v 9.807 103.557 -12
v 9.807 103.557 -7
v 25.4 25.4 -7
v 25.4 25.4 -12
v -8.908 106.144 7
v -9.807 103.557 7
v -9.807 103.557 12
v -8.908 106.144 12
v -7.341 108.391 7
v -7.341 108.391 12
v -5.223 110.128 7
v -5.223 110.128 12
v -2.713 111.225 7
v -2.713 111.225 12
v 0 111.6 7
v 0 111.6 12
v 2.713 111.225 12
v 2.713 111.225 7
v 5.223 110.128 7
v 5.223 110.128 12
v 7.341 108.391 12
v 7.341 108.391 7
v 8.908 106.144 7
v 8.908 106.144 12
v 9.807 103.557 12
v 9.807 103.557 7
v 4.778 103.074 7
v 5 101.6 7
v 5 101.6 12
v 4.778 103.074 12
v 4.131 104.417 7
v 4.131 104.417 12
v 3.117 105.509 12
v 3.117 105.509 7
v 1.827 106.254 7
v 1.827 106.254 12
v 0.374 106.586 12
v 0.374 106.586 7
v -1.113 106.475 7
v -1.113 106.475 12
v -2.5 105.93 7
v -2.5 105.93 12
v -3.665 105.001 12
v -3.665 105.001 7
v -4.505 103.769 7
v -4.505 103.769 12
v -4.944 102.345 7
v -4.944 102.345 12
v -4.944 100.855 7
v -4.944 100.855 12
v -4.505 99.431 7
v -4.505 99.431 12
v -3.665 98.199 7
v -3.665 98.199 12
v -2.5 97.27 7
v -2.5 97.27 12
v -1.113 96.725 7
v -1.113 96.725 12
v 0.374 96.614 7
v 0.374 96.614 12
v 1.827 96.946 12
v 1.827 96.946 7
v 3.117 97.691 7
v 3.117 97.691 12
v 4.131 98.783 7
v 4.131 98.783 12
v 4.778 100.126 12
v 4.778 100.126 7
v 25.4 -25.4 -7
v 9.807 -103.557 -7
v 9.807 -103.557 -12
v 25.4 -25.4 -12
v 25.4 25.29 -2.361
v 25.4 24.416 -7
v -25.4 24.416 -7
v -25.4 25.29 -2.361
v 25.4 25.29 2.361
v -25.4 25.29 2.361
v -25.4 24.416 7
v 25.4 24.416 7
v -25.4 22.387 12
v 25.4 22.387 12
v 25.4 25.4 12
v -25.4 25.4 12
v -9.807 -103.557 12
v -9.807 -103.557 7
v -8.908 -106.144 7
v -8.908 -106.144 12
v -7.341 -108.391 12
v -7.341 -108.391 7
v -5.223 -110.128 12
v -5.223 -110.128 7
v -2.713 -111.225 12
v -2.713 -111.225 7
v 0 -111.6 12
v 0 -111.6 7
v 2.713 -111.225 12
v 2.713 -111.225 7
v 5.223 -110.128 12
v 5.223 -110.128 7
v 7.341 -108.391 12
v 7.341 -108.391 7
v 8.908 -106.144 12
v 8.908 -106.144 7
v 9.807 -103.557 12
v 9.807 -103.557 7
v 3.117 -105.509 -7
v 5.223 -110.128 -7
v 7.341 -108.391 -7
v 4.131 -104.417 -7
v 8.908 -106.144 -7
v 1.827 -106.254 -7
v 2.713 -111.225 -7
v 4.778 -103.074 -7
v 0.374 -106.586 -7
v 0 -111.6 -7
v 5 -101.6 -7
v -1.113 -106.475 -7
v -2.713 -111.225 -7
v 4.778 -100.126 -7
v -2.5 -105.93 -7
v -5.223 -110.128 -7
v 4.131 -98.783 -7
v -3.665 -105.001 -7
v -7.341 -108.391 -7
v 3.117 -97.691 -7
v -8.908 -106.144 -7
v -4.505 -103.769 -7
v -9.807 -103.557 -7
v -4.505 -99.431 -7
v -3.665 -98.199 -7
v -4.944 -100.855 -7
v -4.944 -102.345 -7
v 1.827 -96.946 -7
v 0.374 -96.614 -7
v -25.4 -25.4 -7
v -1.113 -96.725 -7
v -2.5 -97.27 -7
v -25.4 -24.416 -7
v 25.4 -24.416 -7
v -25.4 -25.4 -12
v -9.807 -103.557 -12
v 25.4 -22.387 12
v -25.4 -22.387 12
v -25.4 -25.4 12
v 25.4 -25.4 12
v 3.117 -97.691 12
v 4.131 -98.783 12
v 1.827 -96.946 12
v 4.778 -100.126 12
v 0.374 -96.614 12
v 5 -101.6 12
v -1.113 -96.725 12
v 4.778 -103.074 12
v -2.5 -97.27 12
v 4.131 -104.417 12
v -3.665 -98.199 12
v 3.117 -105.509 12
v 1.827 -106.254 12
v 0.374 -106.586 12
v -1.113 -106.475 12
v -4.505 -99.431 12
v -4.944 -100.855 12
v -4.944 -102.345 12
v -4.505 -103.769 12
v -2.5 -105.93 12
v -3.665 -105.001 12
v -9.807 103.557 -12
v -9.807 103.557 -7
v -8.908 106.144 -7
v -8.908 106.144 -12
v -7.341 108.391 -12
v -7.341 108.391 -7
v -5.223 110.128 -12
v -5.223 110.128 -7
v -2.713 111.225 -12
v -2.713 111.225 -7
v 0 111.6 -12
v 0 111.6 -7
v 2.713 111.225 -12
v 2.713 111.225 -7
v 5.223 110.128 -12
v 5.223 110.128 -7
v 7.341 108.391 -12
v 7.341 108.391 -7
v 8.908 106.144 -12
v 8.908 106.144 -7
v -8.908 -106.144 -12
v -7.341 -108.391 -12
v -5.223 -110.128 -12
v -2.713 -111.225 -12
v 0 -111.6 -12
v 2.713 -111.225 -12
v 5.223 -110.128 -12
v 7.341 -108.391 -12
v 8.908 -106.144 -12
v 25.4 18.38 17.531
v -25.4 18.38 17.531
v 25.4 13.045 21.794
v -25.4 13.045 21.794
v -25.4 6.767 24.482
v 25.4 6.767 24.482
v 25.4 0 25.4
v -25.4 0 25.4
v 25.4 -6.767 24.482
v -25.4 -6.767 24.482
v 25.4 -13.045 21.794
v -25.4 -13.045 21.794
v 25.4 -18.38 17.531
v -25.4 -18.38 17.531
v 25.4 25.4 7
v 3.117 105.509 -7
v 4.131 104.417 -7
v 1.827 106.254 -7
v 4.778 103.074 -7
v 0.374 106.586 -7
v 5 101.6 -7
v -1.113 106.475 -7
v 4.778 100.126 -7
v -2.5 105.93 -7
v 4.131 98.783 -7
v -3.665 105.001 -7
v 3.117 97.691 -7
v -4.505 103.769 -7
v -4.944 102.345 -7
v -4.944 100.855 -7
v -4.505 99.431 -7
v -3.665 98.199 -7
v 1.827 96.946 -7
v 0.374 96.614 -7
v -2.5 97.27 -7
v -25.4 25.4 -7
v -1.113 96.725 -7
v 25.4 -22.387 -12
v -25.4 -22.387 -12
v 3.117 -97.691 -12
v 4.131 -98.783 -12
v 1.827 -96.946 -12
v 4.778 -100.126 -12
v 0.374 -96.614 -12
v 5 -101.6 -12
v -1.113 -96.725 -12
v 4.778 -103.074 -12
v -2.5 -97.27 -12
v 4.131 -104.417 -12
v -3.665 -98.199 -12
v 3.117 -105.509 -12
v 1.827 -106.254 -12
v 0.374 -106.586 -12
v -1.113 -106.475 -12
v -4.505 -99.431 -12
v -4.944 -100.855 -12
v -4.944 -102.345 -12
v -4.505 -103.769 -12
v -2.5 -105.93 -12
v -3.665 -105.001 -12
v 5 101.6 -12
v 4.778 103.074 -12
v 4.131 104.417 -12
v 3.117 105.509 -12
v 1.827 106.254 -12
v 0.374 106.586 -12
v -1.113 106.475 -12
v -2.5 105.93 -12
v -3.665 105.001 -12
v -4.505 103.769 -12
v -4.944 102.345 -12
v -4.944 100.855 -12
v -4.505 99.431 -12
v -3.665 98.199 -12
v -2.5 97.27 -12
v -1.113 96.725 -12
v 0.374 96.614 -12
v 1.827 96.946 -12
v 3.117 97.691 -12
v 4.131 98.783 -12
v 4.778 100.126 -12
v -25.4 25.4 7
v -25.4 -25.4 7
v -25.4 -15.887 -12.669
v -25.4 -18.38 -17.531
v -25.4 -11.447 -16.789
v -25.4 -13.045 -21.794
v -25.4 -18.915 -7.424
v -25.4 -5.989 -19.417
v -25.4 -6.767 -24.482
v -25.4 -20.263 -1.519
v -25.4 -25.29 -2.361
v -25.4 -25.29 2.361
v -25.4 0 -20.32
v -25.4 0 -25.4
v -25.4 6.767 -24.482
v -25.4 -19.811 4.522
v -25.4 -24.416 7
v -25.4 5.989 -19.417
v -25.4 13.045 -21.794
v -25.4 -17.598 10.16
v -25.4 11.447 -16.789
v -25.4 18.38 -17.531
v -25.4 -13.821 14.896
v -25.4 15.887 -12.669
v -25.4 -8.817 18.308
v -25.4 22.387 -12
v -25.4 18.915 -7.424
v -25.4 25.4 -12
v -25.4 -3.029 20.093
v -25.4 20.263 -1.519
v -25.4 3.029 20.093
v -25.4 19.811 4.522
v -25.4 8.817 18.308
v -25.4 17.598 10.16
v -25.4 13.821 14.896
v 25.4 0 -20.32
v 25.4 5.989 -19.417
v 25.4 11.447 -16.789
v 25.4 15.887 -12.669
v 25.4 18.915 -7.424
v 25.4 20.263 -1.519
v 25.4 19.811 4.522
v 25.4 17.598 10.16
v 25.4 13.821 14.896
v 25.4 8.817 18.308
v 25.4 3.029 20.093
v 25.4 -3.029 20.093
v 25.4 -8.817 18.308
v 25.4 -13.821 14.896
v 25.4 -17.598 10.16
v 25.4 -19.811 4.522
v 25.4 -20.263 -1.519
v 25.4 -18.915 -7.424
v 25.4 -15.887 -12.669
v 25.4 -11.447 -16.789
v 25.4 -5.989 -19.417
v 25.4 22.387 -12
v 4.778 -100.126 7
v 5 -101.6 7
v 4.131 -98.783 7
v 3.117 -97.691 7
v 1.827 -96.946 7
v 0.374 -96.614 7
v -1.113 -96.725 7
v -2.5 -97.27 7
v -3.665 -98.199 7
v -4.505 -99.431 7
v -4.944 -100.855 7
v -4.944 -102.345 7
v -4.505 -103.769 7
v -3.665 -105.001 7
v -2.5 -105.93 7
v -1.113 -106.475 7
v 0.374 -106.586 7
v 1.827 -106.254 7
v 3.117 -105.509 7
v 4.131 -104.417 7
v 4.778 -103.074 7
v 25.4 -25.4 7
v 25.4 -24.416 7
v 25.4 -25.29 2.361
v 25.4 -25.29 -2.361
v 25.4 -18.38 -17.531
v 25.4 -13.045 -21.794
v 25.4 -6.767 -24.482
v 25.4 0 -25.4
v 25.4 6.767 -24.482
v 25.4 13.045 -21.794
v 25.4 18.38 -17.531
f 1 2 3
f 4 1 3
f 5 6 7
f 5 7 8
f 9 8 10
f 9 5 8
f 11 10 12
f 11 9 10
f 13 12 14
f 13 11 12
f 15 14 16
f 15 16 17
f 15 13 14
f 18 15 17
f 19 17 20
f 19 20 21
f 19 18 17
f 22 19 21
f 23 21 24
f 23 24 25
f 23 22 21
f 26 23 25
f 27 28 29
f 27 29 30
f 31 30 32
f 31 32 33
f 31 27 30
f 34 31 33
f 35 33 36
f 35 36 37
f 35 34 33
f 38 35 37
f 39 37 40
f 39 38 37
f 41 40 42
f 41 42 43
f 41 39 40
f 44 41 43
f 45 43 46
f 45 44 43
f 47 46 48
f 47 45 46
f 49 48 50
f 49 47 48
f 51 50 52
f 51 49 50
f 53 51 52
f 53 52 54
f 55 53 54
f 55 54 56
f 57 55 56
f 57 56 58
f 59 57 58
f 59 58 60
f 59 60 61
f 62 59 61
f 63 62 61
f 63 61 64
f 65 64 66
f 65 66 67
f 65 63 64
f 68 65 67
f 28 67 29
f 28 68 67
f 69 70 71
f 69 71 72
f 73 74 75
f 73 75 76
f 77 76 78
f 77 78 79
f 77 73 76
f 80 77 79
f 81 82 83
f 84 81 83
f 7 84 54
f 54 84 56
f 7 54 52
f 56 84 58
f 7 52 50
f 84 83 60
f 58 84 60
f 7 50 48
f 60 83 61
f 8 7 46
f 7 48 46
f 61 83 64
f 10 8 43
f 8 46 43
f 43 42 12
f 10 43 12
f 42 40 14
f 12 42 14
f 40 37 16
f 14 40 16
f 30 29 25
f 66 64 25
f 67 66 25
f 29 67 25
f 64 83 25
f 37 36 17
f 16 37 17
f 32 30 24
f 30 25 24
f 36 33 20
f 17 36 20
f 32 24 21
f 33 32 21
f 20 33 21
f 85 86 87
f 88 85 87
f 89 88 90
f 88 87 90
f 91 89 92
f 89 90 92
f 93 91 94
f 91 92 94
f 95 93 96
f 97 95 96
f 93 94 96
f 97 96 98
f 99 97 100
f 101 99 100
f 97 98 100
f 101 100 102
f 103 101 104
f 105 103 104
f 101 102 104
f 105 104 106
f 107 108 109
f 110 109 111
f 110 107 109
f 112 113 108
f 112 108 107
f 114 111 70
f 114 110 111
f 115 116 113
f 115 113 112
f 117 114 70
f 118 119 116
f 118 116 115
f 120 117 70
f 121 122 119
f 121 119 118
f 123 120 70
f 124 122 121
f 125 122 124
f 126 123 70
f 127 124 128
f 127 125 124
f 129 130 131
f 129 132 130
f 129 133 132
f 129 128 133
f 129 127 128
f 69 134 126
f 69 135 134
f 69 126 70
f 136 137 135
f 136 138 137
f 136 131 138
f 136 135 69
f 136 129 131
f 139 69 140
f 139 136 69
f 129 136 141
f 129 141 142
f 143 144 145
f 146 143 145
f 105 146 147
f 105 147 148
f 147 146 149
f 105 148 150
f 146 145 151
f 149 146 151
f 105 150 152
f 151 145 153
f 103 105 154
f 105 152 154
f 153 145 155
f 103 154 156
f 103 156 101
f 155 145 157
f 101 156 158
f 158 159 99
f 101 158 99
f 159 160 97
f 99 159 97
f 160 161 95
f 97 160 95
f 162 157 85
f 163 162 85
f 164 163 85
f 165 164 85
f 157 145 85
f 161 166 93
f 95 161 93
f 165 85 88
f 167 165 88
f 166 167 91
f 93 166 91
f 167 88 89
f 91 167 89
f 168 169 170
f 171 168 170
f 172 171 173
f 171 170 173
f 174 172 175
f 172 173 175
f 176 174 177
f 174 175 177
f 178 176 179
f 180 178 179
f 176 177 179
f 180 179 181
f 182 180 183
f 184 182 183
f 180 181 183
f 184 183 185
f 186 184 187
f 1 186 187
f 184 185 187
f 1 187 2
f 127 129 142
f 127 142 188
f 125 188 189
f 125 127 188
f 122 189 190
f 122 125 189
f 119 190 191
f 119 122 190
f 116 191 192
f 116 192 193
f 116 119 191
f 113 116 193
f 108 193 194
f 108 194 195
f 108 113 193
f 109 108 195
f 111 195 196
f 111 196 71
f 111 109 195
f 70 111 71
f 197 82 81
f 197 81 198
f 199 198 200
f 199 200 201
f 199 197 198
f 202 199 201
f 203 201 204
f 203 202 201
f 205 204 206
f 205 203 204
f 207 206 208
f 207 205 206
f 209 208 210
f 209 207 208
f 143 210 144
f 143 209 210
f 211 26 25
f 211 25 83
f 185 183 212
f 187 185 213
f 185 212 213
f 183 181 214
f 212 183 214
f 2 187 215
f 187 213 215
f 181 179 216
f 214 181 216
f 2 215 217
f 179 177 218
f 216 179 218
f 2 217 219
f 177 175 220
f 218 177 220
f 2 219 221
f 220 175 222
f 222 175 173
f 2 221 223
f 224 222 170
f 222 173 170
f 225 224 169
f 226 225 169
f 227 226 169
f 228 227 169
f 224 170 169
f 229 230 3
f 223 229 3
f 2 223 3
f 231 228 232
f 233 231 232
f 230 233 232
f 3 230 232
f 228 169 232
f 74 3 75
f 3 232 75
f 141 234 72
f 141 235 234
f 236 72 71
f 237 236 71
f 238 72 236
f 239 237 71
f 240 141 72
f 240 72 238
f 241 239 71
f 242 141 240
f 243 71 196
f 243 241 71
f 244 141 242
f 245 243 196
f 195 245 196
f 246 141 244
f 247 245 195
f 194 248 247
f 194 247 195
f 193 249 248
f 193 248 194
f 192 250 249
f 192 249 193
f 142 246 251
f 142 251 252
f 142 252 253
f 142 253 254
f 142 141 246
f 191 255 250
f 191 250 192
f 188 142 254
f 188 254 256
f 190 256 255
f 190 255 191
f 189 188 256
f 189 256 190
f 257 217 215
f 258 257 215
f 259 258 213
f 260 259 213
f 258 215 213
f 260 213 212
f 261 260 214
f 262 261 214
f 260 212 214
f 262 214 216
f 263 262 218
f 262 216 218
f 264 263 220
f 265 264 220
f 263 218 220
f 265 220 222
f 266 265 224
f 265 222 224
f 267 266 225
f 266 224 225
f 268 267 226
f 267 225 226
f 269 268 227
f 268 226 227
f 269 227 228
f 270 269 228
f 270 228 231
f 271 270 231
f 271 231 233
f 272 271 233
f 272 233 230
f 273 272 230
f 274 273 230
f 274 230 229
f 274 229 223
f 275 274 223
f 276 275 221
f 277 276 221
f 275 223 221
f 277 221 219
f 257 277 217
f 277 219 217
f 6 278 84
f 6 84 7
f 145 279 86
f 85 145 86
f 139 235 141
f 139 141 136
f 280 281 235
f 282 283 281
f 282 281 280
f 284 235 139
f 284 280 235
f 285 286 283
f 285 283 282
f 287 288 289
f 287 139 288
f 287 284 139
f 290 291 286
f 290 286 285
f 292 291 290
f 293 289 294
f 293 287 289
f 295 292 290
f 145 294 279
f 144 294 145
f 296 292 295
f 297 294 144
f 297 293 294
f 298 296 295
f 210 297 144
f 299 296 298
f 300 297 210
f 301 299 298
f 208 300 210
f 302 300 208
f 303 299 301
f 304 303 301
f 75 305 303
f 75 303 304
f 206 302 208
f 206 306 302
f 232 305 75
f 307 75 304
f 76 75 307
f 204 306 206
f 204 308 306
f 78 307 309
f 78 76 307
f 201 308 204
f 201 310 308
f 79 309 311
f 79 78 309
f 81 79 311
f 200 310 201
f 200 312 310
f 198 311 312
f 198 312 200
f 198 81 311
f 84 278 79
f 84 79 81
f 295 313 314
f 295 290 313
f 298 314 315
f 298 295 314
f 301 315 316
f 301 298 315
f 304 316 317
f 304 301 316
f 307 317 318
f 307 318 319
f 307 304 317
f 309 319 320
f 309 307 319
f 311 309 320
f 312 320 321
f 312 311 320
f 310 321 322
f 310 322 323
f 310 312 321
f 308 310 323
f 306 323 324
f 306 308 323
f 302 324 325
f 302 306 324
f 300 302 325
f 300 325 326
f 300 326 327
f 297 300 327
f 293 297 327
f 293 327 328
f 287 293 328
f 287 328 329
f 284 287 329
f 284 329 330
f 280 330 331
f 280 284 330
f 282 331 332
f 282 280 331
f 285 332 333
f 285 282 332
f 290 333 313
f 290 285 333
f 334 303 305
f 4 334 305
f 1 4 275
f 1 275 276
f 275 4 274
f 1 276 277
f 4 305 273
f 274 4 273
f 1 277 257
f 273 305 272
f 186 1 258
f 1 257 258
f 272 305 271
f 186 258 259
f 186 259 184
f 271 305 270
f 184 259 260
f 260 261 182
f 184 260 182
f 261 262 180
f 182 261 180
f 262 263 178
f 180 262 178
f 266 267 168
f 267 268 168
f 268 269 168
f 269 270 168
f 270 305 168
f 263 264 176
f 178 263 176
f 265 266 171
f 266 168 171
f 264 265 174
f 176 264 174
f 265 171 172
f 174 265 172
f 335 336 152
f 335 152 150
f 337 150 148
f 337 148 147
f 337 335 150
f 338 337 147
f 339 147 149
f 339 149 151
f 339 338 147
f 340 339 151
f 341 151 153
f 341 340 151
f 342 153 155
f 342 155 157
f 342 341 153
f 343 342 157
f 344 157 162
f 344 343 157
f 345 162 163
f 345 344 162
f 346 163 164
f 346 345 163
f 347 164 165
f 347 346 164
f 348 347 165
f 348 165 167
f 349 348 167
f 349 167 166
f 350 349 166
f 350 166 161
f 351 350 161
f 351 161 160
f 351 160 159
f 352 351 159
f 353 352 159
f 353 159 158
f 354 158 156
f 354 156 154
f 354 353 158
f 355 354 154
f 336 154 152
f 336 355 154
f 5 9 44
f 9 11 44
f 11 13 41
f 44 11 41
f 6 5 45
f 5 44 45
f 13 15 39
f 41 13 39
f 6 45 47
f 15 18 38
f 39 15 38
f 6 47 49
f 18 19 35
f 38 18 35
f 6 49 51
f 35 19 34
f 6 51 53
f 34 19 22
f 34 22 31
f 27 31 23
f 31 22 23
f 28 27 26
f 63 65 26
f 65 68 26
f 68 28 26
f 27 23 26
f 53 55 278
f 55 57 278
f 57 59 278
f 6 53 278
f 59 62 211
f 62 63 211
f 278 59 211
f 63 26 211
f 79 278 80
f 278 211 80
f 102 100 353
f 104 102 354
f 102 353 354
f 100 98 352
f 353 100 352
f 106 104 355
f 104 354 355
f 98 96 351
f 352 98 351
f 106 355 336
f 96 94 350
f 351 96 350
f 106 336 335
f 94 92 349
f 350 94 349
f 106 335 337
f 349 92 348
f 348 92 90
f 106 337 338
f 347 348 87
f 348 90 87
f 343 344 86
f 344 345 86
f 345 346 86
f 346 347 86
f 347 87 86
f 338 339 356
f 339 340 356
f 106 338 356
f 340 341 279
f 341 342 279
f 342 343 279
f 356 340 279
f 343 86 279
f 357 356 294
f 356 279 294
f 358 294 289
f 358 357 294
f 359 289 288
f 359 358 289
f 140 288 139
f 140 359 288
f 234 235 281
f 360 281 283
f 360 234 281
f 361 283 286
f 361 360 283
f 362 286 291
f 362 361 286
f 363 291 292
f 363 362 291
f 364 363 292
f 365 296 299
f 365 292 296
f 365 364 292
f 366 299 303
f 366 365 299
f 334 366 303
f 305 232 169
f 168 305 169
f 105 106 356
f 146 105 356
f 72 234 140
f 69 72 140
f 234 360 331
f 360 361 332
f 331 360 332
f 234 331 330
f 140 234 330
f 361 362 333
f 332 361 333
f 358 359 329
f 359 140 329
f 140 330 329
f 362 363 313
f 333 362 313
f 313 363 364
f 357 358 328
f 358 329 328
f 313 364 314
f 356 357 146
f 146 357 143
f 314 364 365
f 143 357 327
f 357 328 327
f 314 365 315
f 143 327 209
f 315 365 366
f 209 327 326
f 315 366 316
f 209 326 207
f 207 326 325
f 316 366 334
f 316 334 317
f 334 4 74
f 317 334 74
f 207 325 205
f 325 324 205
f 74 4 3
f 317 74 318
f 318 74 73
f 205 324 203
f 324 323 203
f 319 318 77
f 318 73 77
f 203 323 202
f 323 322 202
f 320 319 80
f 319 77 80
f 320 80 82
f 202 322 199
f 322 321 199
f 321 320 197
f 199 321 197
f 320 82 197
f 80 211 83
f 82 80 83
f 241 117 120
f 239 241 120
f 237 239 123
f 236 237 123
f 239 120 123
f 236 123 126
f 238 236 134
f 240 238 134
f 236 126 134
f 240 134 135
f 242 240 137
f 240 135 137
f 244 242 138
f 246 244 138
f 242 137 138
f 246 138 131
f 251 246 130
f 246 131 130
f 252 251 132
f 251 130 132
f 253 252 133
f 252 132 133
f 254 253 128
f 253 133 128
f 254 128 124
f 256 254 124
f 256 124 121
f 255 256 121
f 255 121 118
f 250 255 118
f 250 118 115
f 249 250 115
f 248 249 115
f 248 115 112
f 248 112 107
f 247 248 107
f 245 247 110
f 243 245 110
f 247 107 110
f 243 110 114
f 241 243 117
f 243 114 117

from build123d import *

# Parameters (mm, degrees)
SKETCH3_R             = 25.4
SKETCH3_R_2           = 20.32
BOSS_EXTRUDE1_DEPTH   = 25.4
BOSS_EXTRUDE3_START   = 7
SKETCH4_R             = 5
BOSS_EXTRUDE3_DEPTH   = 5
BOSS_EXTRUDE3_2_DEPTH = 5
BOSS_EXTRUDE4_START   = -7
SKETCH4_2_R           = 5
BOSS_EXTRUDE4_DEPTH   = 5
BOSS_EXTRUDE4_2_DEPTH = 5
BOSS_EXTRUDE5_DEPTH   = 25.4


with BuildPart() as part:
    # Sketch3 → Boss-Extrude1 (new, symmetric)
    with BuildSketch(Plane(origin=(0, 0, 0), x_dir=(0, 0, -1), z_dir=(1, 0, 0))):
        Circle(SKETCH3_R)
        Circle(SKETCH3_R_2, mode=Mode.SUBTRACT)
    extrude(amount=BOSS_EXTRUDE1_DEPTH, both=True)



with BuildPart() as body_2:
    # Sketch4 → Boss-Extrude3 (new body)
    with BuildSketch(Plane.XY.offset(BOSS_EXTRUDE3_START)):
        with BuildLine():
            Line((-25.4, 25.4), (-9.806723533, 103.556571886))
            ThreePointArc((-9.806723533, 103.556571886), (0, 111.6), (9.806723533, 103.556571886))
            Line((9.806723533, 103.556571886), (25.4, 25.4))
            Line((25.4, 25.4), (-25.4, 25.4))
        make_face()
        with Locations((0, 101.6)):
            Circle(SKETCH4_R, mode=Mode.SUBTRACT)
    extrude(amount=BOSS_EXTRUDE3_DEPTH)


with BuildPart() as body_3:
    # Sketch4 → Boss-Extrude3 2 (new body)
    with BuildSketch(Plane.XY.offset(BOSS_EXTRUDE3_START)):
        with BuildLine():
            Line((-25.4, -25.4), (-9.806723533, -103.556571886))
            ThreePointArc((-9.806723533, -103.556571886), (0, -111.6), (9.806723533, -103.556571886))
            Line((9.806723533, -103.556571886), (25.4, -25.4))
            Line((25.4, -25.4), (-25.4, -25.4))
        make_face()
        with Locations((0, -101.6)):
            Circle(SKETCH4_R, mode=Mode.SUBTRACT)
    extrude(amount=BOSS_EXTRUDE3_2_DEPTH)


with BuildPart() as body_4:
    # Sketch4<2> → Boss-Extrude4 (new body)
    with BuildSketch(Plane.XY.offset(BOSS_EXTRUDE4_START)):
        with BuildLine():
            Line((-25.4, 25.4), (-9.806723533, 103.556571886))
            ThreePointArc((-9.806723533, 103.556571886), (0, 111.6), (9.806723533, 103.556571886))
            Line((9.806723533, 103.556571886), (25.4, 25.4))
            Line((25.4, 25.4), (-25.4, 25.4))
        make_face()
        with Locations((0, 101.6)):
            Circle(SKETCH4_2_R, mode=Mode.SUBTRACT)
    extrude(amount=-BOSS_EXTRUDE4_DEPTH)


with BuildPart() as body_5:
    # Sketch4<2> → Boss-Extrude4 2 (new body)
    with BuildSketch(Plane.XY.offset(BOSS_EXTRUDE4_START)):
        with BuildLine():
            Line((-25.4, -25.4), (-9.806723533, -103.556571886))
            ThreePointArc((-9.806723533, -103.556571886), (0, -111.6), (9.806723533, -103.556571886))
            Line((9.806723533, -103.556571886), (25.4, -25.4))
            Line((25.4, -25.4), (-25.4, -25.4))
        make_face()
        with Locations((0, -101.6)):
            Circle(SKETCH4_2_R, mode=Mode.SUBTRACT)
    extrude(amount=-BOSS_EXTRUDE4_2_DEPTH)


with BuildPart() as part_1:
    add(part.part)

    add(body_2.part)  # Boss-Extrude5 merges body 2

    add(body_3.part)  # Boss-Extrude5 merges body 3

    add(body_4.part)  # Boss-Extrude5 merges body 4

    add(body_5.part)  # Boss-Extrude5 merges body 5
    # Sketch5 → Boss-Extrude5 (add, symmetric)
    with BuildSketch(Plane(origin=(0, 0, 0), x_dir=(0, 0, -1), z_dir=(1, 0, 0))):
        with BuildLine():
            Line((12, -25.4), (7, -25.4))
            Line((7, -25.4), (7, -24.416387939))
            ThreePointArc((7, -24.416387939), (9.554057075, -23.534655158), (12, -22.386603137))
            Line((12, -22.386603137), (12, -25.4))
        make_face()
        with BuildLine():
            Line((-12, -25.4), (-7, -25.4))
            Line((-7, -25.4), (-7, -24.416387939))
            ThreePointArc((-7, -24.416387939), (-9.554057075, -23.534655158), (-12, -22.386603137))
            Line((-12, -22.386603137), (-12, -25.4))
        make_face()
        with BuildLine():
            Line((12, 25.4), (7, 25.4))
            Line((7, 25.4), (7, 24.416387939))
            ThreePointArc((7, 24.416387939), (9.554057075, 23.534655158), (12, 22.386603137))
            Line((12, 22.386603137), (12, 25.4))
        make_face()
        with BuildLine():
            Line((-12, 25.4), (-7, 25.4))
            Line((-7, 25.4), (-7, 24.416387939))
            ThreePointArc((-7, 24.416387939), (-9.554057075, 23.534655158), (-12, 22.386603137))
            Line((-12, 22.386603137), (-12, 25.4))
        make_face()
    extrude(amount=BOSS_EXTRUDE5_DEPTH, both=True)


solid = part_1.part
